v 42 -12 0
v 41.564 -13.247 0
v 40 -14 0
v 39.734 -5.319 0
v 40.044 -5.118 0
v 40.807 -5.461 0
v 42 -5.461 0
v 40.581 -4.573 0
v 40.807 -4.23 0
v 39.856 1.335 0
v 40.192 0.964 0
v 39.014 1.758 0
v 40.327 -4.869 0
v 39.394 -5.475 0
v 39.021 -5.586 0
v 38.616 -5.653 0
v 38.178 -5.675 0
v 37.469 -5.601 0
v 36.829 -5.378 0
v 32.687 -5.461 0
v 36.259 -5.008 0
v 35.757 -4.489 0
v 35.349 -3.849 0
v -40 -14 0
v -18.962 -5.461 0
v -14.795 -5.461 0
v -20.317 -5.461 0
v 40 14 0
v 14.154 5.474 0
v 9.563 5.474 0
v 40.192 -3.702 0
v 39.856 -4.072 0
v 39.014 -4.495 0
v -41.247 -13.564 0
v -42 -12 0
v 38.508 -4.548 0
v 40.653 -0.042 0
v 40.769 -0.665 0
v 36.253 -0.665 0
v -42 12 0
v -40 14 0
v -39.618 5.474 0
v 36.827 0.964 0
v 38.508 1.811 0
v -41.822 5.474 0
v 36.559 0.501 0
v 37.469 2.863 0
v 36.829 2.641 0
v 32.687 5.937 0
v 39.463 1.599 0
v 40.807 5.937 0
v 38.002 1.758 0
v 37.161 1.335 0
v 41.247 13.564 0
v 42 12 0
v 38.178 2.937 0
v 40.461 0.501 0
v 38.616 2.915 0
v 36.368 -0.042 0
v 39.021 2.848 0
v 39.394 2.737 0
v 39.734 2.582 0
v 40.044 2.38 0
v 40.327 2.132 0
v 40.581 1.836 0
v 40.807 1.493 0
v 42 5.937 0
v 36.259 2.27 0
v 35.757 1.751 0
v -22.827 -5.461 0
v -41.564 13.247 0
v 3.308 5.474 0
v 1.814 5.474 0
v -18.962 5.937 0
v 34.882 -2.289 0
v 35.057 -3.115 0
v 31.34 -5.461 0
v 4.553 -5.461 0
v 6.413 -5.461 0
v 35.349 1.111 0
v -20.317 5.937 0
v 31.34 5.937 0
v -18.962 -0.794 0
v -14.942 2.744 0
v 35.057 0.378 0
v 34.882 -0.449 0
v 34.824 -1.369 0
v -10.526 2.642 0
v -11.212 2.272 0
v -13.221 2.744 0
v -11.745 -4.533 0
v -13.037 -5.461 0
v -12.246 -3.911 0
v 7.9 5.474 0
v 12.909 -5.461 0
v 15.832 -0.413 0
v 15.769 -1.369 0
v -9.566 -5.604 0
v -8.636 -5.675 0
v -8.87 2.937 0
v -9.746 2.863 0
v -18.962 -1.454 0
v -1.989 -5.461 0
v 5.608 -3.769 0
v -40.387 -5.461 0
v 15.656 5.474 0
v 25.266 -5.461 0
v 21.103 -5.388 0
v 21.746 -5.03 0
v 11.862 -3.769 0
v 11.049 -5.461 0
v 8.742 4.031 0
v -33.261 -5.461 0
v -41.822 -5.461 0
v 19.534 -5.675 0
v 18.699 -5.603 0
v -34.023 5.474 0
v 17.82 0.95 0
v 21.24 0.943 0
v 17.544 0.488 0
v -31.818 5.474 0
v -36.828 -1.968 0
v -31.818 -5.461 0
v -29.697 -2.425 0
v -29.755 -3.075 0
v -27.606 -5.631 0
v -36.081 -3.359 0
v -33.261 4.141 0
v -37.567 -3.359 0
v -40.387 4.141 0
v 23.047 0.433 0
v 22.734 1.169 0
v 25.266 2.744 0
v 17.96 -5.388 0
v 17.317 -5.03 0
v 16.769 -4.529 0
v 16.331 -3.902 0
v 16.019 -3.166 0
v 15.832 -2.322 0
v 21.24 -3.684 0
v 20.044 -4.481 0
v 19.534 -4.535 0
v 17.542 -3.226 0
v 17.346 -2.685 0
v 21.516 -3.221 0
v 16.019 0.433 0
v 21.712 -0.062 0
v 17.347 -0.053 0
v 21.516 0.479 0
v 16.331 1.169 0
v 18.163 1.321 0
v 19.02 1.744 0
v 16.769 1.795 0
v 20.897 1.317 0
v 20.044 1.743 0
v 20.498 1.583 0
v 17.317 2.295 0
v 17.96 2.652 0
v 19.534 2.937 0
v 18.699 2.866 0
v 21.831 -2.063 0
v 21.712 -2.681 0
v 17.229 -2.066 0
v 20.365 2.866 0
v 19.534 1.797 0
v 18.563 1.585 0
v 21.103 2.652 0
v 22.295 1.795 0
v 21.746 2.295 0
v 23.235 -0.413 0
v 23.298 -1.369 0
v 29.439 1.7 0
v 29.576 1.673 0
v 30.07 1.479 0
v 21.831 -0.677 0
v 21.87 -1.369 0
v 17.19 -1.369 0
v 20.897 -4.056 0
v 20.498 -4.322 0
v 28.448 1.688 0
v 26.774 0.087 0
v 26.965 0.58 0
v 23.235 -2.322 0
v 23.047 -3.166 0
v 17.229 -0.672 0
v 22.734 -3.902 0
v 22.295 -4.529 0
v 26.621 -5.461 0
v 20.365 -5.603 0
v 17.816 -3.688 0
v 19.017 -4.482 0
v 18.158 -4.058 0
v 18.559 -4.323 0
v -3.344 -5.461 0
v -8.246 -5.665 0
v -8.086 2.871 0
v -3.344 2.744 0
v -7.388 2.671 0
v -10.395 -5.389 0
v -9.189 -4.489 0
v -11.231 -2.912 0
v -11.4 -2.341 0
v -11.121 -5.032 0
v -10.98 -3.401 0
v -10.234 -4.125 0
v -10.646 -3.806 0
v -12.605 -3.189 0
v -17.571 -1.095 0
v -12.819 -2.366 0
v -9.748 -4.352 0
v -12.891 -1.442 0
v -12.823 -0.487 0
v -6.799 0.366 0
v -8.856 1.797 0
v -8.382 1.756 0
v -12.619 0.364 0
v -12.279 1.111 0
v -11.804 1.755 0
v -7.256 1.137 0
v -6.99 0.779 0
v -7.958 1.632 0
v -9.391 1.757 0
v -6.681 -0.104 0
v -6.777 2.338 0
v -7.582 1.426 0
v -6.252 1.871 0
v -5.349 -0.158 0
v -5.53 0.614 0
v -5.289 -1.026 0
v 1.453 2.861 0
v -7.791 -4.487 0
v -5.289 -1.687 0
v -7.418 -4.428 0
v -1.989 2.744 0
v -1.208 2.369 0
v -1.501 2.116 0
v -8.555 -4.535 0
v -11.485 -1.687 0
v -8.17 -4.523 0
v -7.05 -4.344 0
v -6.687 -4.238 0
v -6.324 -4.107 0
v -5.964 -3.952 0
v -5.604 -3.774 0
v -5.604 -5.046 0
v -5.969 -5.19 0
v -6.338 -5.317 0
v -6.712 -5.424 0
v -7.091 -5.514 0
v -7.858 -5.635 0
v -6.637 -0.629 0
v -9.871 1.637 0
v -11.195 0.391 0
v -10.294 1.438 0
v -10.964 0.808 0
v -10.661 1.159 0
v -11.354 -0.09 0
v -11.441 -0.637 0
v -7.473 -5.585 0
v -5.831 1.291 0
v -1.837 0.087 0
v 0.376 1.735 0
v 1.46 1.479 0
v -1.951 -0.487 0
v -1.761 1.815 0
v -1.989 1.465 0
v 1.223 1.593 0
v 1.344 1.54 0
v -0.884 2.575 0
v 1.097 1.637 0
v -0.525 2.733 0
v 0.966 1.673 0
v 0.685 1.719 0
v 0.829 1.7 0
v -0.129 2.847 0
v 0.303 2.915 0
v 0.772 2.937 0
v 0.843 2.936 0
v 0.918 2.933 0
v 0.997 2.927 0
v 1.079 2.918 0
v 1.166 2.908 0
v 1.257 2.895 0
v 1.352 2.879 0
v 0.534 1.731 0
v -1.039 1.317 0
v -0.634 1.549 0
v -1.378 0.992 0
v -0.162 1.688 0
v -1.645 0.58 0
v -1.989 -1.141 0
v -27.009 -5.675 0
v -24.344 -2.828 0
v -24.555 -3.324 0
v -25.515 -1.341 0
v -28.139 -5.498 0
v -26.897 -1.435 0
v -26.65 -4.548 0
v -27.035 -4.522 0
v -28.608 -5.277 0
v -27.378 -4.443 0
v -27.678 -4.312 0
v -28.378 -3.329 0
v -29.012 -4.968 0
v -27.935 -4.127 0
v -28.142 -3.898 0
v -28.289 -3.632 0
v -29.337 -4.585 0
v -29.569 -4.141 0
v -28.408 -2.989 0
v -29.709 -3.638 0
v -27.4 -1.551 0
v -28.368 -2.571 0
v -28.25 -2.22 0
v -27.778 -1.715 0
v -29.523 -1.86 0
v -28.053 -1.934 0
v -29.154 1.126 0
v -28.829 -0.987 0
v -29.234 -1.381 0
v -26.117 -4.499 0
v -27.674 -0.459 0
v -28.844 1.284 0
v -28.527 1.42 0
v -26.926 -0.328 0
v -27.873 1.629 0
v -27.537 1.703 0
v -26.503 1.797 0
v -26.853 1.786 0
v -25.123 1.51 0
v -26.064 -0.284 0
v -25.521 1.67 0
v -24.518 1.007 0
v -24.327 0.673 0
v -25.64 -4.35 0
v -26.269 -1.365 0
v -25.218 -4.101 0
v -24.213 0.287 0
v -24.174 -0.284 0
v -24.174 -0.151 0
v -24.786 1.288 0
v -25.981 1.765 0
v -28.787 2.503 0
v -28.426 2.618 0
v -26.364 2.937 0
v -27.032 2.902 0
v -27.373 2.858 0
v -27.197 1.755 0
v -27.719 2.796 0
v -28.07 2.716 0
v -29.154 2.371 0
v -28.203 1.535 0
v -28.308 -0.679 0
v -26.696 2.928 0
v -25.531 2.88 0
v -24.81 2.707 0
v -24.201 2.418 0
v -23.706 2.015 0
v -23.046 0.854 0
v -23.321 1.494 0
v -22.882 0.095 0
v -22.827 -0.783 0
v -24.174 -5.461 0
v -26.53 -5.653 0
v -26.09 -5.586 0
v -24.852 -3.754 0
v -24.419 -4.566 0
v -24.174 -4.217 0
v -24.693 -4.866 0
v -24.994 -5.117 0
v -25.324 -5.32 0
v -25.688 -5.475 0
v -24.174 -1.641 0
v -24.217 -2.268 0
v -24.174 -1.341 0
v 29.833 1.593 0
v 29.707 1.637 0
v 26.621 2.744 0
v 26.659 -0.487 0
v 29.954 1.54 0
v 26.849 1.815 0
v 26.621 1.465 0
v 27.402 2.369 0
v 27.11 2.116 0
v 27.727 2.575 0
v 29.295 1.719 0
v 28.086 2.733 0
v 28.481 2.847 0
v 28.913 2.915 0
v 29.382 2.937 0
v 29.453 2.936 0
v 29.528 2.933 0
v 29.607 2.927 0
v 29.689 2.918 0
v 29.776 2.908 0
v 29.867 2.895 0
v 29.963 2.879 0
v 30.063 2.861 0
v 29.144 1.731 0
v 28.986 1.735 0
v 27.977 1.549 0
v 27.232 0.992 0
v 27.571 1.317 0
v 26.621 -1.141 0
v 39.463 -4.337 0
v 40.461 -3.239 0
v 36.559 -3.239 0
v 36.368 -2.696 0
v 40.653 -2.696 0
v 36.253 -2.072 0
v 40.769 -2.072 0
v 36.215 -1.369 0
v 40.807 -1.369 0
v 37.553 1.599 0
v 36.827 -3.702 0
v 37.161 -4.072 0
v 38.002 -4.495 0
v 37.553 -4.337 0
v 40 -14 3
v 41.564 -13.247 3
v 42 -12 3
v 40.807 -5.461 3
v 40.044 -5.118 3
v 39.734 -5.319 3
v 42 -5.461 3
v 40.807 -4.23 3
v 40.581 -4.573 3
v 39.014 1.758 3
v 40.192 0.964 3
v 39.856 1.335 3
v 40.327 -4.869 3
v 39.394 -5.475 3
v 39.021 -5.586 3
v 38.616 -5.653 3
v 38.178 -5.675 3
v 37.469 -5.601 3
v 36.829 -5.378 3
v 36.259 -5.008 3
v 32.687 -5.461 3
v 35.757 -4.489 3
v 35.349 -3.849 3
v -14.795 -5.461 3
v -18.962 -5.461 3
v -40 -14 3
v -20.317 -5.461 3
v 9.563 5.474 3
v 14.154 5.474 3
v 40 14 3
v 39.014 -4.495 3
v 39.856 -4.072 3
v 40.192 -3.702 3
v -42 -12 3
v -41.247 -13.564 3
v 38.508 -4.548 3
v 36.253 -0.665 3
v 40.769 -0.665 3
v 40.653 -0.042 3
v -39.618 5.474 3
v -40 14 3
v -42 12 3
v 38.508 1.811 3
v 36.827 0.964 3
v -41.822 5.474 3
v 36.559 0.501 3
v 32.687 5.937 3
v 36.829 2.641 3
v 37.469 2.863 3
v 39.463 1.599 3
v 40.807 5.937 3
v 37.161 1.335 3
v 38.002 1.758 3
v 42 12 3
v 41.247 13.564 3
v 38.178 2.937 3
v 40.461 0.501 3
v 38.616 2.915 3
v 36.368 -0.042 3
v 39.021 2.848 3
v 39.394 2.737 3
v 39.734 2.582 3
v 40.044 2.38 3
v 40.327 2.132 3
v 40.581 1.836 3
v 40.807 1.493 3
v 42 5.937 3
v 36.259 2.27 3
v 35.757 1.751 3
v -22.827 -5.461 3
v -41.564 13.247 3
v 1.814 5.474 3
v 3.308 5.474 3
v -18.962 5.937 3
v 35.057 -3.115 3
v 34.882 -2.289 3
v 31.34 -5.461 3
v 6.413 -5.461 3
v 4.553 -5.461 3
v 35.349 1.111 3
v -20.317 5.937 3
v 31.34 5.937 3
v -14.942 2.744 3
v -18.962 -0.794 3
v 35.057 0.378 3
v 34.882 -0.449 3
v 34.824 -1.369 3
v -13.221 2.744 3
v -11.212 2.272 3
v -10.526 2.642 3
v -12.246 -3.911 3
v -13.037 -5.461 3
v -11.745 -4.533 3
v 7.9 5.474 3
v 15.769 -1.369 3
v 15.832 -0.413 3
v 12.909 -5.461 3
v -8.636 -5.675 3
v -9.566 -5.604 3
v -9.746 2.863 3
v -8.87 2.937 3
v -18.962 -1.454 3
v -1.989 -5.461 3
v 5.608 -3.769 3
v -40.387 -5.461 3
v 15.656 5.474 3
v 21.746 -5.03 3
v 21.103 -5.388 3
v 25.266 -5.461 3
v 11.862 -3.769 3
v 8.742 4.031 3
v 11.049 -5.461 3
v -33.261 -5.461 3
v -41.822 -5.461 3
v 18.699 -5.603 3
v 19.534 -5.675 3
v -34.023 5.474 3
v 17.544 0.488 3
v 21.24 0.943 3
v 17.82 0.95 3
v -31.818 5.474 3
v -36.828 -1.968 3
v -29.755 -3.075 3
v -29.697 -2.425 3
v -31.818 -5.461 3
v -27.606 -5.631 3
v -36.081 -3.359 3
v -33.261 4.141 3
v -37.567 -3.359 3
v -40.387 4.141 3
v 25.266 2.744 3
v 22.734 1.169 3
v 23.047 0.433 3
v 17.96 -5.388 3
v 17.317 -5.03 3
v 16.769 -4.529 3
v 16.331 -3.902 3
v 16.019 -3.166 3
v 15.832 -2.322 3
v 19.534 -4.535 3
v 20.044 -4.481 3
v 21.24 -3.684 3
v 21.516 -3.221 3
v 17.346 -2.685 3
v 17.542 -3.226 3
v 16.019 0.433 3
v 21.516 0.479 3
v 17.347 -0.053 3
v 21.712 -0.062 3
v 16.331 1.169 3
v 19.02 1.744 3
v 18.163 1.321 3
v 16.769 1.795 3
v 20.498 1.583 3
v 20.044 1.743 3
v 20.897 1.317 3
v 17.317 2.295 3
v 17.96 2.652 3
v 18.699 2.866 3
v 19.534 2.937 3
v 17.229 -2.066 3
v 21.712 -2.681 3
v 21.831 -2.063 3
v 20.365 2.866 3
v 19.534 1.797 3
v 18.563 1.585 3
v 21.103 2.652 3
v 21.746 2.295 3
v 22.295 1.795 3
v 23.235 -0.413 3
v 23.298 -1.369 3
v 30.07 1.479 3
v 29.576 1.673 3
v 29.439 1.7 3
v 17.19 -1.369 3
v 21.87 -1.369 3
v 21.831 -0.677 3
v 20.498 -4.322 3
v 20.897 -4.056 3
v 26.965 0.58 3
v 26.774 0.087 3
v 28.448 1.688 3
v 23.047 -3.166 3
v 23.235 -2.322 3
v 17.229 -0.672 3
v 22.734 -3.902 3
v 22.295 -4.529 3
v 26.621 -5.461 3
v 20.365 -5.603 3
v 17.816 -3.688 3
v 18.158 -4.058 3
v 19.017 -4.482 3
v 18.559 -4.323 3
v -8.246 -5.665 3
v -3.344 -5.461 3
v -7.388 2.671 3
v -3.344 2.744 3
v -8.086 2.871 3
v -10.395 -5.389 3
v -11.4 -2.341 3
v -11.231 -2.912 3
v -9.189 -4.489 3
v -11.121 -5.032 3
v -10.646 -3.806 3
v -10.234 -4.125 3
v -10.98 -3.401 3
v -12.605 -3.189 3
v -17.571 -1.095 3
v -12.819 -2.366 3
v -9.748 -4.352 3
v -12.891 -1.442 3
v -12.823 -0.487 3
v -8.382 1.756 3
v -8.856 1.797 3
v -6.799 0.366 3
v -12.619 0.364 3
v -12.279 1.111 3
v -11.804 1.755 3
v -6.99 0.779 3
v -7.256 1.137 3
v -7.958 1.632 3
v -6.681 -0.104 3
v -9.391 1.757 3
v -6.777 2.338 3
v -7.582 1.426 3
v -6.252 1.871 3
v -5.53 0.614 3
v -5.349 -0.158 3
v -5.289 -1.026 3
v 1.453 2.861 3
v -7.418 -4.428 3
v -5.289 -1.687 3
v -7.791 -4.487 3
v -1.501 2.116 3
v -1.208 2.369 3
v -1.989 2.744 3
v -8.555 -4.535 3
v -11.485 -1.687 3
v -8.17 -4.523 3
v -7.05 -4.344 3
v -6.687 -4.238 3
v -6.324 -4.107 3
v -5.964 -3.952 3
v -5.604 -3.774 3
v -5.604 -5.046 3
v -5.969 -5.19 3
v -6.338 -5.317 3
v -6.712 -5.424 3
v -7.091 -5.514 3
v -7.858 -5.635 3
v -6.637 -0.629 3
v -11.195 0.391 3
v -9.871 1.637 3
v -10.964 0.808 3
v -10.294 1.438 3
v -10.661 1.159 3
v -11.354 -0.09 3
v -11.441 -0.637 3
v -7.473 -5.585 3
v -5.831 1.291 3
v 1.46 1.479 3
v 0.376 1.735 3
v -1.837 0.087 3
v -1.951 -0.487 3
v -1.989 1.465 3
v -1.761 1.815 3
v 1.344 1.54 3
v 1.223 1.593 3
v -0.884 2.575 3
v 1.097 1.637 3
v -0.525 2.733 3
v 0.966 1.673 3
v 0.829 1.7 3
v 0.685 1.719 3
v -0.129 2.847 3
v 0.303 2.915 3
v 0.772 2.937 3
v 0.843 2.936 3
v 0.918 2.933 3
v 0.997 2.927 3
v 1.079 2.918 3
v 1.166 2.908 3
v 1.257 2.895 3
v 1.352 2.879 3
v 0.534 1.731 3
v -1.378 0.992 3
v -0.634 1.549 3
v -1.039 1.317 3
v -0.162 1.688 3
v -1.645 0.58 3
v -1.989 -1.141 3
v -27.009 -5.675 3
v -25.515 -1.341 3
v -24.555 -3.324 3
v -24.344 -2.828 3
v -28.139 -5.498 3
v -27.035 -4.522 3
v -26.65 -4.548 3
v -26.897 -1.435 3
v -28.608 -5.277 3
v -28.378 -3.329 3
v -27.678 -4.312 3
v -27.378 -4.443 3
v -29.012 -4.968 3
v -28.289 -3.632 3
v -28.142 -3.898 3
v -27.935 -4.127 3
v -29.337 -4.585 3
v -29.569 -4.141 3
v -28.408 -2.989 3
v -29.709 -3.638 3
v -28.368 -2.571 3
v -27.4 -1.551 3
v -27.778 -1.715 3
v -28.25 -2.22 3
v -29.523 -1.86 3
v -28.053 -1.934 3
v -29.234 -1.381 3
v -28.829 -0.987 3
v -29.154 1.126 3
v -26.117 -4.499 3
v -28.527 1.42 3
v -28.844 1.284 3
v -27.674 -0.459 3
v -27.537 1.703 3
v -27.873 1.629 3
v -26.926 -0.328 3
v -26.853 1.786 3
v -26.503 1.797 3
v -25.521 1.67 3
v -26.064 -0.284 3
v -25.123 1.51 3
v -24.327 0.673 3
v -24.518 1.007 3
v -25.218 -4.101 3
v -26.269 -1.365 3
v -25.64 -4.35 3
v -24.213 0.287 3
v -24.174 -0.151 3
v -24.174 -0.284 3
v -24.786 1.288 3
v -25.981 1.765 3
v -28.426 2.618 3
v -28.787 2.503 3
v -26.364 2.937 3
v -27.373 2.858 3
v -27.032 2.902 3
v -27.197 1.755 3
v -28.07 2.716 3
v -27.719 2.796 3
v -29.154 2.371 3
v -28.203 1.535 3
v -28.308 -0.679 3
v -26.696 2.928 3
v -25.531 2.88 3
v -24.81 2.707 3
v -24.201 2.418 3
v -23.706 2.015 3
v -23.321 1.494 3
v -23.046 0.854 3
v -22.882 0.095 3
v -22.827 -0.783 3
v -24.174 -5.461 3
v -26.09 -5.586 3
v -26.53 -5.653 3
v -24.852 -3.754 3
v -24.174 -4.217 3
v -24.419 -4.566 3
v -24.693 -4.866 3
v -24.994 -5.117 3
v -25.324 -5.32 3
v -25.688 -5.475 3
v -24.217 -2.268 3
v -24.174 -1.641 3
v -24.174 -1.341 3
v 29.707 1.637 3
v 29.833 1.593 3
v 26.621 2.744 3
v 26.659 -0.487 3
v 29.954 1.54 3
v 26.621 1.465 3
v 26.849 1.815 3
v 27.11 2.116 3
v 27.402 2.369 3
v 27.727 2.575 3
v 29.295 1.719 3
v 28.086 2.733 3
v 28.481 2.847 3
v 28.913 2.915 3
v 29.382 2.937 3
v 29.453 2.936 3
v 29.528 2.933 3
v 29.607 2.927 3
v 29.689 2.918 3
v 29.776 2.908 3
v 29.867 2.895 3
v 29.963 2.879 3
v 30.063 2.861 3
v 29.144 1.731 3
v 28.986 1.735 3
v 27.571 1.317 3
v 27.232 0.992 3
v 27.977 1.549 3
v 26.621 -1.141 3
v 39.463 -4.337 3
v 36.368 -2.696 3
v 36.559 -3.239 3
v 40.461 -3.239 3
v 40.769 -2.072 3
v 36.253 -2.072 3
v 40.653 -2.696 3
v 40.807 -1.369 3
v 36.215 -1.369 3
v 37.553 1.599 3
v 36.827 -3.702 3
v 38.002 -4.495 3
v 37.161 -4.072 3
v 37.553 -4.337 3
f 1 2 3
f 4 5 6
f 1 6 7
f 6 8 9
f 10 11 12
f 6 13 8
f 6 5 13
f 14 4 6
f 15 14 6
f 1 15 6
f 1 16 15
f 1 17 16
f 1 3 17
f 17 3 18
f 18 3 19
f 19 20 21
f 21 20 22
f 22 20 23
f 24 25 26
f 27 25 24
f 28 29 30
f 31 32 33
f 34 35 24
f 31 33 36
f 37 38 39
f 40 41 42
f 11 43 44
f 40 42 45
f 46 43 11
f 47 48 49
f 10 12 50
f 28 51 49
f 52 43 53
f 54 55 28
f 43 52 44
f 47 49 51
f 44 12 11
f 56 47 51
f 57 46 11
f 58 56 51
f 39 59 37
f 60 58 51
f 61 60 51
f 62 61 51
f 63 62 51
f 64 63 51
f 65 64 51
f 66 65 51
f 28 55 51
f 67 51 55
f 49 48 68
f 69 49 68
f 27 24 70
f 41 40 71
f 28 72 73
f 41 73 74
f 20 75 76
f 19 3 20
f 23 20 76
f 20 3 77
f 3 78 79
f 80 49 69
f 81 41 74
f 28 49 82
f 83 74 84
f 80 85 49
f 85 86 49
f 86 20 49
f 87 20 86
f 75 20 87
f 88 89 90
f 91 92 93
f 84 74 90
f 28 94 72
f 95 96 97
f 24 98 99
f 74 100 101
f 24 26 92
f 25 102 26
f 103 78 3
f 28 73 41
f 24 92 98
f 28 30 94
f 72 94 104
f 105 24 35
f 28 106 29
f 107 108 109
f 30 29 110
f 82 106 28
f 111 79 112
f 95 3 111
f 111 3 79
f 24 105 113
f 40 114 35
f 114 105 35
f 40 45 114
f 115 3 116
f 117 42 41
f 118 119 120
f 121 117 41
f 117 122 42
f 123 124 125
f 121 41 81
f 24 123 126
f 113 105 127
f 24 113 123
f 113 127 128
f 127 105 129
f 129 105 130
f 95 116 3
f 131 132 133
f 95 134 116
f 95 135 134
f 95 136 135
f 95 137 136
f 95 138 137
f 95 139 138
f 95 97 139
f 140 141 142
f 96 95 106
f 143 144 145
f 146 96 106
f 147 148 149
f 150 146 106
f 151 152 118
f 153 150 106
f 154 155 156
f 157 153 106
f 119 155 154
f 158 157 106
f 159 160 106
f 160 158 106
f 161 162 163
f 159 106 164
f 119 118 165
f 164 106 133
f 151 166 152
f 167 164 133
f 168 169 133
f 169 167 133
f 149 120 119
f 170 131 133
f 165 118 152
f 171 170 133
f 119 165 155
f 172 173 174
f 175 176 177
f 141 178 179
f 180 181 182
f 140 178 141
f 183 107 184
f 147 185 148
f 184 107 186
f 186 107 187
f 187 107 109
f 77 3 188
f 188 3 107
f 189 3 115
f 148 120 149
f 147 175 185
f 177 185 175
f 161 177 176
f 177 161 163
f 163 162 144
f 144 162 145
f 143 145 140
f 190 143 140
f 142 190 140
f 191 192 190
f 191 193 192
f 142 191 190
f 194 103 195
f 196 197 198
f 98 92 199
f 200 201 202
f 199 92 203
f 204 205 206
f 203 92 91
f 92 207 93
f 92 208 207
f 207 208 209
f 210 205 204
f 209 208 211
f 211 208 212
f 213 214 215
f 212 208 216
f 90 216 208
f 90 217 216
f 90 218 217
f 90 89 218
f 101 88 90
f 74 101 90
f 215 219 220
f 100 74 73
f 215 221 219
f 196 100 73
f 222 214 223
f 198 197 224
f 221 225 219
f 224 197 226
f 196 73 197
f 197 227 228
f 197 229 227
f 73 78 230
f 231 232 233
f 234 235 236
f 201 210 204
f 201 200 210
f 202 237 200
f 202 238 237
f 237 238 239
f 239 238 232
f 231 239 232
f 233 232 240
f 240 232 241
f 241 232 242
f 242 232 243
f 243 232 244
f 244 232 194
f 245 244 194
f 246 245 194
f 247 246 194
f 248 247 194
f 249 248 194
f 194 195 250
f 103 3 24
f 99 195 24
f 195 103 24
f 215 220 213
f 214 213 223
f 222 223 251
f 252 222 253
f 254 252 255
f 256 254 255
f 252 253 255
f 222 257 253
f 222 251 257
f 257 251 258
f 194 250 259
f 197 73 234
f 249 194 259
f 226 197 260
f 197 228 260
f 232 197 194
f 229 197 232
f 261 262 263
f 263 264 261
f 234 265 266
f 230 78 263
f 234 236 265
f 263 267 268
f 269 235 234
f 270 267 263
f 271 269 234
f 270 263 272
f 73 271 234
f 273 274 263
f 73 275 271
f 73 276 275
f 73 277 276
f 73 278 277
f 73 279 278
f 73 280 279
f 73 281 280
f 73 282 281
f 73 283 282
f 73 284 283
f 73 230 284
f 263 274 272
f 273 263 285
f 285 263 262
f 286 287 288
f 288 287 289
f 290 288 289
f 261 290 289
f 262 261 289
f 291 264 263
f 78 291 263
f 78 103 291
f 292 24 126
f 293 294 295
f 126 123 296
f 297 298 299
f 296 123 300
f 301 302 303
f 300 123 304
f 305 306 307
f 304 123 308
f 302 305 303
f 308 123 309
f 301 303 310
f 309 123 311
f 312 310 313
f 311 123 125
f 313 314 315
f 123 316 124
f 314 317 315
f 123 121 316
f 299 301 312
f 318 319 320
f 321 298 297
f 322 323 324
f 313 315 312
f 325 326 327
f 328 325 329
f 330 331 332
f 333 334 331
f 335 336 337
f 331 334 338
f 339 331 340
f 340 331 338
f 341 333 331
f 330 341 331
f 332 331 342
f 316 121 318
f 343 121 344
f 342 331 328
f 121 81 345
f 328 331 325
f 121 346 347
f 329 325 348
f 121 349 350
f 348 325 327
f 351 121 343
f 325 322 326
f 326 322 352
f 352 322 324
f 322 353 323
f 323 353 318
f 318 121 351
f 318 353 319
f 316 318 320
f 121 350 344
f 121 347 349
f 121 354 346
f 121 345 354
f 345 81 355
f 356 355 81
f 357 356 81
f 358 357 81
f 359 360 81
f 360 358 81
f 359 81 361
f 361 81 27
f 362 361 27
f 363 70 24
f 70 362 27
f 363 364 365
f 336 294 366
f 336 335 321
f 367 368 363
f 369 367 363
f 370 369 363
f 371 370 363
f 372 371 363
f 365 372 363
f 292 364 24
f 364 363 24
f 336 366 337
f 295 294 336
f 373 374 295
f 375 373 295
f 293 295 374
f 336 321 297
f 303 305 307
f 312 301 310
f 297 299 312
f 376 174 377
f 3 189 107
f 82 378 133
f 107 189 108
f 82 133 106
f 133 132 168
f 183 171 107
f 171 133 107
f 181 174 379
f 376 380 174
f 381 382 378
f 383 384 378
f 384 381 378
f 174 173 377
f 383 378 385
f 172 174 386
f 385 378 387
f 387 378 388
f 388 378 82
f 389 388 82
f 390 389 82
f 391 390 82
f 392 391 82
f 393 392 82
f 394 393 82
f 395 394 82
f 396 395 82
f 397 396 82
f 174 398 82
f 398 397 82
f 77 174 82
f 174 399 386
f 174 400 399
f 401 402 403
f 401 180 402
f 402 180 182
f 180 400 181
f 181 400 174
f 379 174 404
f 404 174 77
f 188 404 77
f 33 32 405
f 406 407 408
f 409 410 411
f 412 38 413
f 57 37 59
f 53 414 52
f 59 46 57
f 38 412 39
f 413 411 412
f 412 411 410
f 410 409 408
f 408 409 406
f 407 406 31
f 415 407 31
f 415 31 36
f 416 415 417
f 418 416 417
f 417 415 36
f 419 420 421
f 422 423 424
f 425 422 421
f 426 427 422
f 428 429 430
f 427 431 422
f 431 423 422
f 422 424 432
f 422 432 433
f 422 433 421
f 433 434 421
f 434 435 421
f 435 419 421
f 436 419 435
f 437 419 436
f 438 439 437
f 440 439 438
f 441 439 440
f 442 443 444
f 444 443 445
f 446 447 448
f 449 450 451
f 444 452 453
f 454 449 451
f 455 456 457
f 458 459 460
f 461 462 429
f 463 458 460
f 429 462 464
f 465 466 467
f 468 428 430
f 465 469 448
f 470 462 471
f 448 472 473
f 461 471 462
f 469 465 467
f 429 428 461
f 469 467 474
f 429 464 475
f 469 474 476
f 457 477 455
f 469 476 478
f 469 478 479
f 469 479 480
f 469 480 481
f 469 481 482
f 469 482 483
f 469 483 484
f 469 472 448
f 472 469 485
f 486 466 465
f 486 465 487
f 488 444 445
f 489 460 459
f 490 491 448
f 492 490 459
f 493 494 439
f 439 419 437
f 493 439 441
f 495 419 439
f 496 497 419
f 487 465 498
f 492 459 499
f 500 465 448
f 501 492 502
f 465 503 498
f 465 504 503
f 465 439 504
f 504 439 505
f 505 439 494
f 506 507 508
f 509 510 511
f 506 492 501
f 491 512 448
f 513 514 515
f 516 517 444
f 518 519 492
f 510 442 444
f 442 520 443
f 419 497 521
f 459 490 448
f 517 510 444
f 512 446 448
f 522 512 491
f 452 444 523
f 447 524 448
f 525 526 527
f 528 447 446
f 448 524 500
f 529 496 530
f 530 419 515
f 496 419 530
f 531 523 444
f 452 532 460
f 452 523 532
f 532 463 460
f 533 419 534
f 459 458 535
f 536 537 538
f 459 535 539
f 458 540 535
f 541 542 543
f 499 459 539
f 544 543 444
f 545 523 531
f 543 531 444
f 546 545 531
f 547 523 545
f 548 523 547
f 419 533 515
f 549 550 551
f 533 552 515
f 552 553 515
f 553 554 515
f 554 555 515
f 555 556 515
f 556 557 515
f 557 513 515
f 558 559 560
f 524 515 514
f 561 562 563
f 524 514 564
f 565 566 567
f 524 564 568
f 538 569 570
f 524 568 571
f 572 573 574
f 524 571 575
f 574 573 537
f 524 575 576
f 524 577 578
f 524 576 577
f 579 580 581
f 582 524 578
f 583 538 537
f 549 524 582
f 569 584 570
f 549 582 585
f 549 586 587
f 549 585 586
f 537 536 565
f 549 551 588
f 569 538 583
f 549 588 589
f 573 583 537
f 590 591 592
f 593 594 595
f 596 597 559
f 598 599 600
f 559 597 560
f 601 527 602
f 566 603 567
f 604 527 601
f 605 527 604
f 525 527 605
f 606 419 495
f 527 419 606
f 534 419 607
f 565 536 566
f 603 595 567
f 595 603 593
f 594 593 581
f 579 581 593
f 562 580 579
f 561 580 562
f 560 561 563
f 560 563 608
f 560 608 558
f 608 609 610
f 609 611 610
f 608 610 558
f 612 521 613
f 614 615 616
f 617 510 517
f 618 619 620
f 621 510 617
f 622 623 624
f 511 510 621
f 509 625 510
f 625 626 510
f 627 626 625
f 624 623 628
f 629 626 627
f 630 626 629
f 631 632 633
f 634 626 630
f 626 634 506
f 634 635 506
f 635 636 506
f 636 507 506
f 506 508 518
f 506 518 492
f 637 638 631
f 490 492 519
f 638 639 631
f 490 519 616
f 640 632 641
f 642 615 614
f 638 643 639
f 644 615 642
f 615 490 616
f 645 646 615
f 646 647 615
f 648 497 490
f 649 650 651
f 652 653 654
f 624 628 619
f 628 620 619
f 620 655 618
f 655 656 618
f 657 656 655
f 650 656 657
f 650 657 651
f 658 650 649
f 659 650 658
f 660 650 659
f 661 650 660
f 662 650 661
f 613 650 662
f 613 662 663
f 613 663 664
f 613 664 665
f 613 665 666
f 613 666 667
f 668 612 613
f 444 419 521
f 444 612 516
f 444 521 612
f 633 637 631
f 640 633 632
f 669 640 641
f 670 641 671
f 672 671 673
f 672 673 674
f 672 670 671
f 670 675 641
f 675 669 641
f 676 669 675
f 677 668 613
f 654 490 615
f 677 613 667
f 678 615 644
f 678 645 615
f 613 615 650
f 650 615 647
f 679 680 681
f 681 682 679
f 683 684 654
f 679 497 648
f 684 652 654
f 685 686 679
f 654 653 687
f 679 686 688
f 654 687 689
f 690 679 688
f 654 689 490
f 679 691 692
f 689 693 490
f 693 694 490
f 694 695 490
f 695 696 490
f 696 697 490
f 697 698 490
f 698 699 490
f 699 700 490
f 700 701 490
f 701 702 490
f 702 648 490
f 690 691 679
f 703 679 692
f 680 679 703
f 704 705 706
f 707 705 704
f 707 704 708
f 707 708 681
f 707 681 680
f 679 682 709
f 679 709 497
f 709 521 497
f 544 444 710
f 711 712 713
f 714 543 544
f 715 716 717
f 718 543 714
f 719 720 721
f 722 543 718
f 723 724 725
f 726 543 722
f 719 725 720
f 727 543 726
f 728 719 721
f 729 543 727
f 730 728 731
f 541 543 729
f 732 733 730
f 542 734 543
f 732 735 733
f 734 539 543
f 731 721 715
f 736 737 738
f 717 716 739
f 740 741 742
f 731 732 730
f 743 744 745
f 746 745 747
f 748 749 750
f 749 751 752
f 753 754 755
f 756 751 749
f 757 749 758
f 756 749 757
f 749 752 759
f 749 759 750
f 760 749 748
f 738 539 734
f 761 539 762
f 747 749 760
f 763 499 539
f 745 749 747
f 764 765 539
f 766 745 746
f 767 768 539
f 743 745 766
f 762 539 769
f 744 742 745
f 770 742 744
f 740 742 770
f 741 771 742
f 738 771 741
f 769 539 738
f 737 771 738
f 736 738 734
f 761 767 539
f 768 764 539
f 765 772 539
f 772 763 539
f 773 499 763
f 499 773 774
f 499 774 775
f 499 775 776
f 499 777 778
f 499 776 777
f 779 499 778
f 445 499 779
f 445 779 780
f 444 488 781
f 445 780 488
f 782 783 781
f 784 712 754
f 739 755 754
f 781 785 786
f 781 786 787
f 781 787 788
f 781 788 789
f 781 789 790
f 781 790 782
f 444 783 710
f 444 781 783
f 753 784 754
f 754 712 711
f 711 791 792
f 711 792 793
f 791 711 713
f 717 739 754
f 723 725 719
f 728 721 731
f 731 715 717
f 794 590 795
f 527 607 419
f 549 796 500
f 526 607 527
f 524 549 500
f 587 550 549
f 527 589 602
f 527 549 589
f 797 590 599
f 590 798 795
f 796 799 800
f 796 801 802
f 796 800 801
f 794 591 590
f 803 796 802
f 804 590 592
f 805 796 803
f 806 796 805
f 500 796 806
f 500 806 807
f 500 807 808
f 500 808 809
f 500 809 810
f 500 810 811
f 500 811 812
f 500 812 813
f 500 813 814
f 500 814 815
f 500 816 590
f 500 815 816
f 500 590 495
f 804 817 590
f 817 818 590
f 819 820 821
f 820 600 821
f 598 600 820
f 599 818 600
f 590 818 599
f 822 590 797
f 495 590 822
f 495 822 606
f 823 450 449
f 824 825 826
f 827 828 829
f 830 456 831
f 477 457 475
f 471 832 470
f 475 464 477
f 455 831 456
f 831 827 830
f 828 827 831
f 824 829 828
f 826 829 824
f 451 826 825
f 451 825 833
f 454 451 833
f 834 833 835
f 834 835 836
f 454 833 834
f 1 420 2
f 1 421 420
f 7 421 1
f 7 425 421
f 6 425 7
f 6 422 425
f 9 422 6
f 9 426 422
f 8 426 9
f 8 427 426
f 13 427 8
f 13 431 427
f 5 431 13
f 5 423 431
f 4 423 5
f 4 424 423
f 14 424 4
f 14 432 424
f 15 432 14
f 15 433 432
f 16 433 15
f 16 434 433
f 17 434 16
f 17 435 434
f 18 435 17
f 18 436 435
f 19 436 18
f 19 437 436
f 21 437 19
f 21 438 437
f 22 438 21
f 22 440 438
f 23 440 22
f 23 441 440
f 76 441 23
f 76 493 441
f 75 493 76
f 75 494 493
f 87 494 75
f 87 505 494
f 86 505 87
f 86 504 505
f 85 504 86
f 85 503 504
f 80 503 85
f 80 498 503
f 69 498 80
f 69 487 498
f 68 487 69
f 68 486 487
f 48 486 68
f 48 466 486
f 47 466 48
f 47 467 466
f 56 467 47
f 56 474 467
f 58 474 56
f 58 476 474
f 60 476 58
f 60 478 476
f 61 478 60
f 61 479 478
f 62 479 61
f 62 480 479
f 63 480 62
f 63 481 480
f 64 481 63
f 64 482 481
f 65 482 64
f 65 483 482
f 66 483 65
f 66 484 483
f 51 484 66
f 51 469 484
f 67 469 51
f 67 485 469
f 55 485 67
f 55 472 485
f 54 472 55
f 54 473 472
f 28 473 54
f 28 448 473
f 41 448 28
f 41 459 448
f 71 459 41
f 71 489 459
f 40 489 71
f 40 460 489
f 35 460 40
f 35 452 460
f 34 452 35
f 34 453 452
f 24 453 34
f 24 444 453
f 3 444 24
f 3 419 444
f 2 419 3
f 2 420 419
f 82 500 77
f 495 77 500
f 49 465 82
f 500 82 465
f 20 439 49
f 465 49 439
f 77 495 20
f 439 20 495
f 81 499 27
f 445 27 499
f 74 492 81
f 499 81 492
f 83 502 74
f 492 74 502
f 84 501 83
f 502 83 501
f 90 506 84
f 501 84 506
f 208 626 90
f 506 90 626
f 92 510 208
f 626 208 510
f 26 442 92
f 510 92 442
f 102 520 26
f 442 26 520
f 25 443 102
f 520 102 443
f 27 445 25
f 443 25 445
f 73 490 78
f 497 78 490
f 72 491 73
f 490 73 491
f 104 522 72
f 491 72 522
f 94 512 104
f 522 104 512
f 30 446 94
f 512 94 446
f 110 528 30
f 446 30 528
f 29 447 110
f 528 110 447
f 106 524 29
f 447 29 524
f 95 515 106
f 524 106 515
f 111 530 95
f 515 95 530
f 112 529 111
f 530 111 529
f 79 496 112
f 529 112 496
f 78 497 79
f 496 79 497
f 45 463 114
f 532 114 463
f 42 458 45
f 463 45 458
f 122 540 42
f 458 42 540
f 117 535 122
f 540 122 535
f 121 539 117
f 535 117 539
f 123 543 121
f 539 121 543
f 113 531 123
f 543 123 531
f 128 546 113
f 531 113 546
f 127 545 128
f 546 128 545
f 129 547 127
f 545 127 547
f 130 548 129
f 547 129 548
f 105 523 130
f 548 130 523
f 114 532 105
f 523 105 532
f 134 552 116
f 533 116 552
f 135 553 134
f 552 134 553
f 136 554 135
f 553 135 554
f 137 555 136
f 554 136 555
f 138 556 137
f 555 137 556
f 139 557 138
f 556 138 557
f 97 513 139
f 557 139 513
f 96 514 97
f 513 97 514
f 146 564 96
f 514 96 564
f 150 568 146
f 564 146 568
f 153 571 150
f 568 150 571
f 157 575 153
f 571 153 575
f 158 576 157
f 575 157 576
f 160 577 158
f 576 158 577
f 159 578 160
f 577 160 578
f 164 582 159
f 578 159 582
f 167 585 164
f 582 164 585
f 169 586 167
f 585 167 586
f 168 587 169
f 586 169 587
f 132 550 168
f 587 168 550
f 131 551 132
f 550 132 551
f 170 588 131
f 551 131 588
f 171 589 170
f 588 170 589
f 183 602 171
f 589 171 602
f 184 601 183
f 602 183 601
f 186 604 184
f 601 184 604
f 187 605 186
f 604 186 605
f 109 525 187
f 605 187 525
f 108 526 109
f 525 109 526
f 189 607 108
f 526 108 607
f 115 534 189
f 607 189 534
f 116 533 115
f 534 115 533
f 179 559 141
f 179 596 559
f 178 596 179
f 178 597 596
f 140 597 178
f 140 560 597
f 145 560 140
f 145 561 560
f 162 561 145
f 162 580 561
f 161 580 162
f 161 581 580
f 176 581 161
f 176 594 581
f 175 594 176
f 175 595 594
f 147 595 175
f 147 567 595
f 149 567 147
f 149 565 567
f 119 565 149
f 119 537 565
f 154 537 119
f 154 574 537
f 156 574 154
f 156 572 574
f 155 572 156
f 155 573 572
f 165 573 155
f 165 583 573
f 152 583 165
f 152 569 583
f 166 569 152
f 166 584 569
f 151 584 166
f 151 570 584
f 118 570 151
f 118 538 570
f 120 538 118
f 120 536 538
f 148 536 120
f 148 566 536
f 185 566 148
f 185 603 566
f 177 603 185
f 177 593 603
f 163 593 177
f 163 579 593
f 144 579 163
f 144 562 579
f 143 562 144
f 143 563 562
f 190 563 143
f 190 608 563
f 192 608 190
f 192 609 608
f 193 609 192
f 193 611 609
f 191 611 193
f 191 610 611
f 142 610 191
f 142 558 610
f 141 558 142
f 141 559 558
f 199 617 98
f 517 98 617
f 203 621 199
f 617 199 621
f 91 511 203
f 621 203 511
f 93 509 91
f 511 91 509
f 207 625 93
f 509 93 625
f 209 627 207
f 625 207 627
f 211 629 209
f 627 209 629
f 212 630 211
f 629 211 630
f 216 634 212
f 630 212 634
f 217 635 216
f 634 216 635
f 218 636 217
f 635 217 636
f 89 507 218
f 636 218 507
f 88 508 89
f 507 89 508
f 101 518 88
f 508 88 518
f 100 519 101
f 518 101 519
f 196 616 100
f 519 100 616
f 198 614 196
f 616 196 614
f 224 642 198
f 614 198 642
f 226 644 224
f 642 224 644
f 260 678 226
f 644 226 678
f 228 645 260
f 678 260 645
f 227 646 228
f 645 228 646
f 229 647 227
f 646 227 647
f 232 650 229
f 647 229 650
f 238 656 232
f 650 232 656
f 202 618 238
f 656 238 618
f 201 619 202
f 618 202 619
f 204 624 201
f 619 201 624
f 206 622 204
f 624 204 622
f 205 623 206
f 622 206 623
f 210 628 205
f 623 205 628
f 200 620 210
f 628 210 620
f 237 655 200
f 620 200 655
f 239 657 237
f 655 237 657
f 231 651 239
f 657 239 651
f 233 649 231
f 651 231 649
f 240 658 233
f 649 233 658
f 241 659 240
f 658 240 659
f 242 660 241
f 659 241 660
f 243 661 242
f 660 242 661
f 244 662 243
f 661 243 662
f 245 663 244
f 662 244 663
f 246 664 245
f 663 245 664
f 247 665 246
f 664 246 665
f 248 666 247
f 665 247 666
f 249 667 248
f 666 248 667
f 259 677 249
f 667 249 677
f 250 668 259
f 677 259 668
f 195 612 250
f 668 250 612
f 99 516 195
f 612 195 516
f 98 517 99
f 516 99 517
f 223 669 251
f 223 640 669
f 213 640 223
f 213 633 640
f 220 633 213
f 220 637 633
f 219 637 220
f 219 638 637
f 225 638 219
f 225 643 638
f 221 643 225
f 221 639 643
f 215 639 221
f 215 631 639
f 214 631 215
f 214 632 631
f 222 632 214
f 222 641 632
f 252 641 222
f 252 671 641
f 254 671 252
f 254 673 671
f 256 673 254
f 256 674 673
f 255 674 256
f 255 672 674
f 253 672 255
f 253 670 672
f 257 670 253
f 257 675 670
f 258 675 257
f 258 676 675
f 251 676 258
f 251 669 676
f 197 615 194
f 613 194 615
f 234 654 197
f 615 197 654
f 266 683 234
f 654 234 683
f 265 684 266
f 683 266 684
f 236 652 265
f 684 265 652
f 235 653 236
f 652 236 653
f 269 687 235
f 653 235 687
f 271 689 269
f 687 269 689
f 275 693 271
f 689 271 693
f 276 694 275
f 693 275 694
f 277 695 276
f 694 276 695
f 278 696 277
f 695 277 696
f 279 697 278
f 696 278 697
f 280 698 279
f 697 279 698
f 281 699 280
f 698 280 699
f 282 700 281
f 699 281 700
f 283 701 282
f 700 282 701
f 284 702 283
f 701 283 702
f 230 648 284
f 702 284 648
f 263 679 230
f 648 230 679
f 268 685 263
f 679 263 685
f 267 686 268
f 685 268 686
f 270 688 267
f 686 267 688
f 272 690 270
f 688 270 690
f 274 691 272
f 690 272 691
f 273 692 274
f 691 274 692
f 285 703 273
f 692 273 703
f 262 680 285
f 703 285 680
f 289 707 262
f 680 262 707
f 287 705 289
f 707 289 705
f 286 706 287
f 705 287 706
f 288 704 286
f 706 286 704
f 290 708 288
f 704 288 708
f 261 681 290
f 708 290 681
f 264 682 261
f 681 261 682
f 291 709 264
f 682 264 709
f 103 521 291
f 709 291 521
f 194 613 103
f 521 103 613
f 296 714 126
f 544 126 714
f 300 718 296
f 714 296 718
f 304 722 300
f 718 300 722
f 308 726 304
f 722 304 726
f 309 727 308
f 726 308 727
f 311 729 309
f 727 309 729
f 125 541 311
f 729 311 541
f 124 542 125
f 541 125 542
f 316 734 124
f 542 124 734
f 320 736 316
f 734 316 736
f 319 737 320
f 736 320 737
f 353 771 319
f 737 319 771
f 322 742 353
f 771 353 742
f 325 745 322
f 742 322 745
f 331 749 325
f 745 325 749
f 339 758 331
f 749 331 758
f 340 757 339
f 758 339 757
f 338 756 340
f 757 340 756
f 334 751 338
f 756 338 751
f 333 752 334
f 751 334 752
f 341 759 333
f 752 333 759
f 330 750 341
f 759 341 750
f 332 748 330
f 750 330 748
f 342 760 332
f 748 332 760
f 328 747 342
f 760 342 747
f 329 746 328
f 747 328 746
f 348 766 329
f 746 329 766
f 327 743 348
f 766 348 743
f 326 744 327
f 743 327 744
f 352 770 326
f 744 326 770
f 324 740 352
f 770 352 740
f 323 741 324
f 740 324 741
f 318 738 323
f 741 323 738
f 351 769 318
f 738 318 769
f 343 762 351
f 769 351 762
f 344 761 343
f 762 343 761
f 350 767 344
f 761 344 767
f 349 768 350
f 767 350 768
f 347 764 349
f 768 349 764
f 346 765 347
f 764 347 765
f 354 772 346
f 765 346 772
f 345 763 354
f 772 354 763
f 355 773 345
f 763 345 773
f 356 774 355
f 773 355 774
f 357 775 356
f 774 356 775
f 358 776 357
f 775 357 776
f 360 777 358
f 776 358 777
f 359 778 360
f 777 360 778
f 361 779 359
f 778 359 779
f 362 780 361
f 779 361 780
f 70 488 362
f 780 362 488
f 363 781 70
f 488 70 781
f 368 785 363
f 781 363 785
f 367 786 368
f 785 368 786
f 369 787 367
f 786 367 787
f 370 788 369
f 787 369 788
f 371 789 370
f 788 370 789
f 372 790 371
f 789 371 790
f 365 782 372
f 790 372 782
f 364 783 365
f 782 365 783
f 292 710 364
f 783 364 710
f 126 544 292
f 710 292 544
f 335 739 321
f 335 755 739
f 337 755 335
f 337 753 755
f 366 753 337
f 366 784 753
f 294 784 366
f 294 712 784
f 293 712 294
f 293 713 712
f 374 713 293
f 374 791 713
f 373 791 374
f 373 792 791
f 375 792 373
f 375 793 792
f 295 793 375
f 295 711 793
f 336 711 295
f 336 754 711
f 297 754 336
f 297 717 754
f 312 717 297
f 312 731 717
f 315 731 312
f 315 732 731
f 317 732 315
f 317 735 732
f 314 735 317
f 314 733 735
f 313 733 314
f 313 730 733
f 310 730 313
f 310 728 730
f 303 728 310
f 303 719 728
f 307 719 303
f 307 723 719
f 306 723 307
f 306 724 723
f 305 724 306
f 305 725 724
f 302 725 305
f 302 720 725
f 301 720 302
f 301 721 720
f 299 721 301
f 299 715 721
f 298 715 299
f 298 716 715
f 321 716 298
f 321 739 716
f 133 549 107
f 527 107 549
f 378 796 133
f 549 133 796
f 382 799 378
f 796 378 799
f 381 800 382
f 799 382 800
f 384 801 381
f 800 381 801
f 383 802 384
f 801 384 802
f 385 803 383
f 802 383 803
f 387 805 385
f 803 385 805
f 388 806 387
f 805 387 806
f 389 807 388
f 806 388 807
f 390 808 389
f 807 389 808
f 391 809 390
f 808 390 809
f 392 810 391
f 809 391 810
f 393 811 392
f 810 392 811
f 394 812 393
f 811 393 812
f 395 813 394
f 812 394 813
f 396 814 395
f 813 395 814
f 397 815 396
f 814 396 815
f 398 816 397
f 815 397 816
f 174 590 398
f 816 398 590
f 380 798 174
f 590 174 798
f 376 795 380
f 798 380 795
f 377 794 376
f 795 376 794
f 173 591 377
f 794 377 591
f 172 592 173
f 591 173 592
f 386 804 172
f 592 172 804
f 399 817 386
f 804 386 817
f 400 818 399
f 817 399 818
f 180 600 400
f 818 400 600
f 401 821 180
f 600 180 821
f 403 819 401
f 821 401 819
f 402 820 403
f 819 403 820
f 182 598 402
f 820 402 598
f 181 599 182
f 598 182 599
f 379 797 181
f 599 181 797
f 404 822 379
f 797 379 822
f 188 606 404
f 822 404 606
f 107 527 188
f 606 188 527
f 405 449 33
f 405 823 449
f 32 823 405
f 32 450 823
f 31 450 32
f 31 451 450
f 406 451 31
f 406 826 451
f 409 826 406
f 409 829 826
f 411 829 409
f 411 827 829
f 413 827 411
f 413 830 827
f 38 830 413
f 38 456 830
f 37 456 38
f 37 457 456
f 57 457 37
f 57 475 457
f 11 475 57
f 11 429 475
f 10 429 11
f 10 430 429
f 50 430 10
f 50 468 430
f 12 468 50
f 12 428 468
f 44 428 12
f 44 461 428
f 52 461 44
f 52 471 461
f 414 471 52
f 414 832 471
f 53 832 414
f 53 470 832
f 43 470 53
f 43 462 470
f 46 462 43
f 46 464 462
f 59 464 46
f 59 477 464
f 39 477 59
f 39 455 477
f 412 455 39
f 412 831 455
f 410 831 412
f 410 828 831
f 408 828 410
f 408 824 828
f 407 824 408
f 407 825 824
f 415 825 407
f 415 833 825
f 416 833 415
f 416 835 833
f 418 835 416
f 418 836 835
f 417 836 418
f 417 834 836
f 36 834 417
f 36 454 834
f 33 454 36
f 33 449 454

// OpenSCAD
// PMM-ready OpenSCAD template.
// Use this as a starting point when adapting a local model for MakerWorld PMM.
// Read:
// - docs/agent-workflow.md
// - docs/feature-reference.md
// - docs/compatibility-rules.md

// Basic user-facing parameters.
label_text = "MakerWorld";
width_mm = 80;
height_mm = 24;
thickness_mm = 3;

// Optional PMM UI parameters.
accent_hex = "#FF6600"; // color
font_name = "Roboto"; // font

module core_model() {
    linear_extrude(thickness_mm)
    difference() {
        offset(r = 2)
            square([width_mm, height_mm], center = true);
        text(label_text, font = font_name, size = height_mm * 0.45, halign = "center", valign = "center");
    }
}

// Default single-plate output.
color(accent_hex)
core_model();

// Optional PMM multi-plate structure.
// Uncomment and adapt only if the model truly benefits from multi-plate 3MF.
//
// module mw_plate_1() {
//     core_model();
// }
//
// module mw_assembly_view() {
//     core_model();
// }
